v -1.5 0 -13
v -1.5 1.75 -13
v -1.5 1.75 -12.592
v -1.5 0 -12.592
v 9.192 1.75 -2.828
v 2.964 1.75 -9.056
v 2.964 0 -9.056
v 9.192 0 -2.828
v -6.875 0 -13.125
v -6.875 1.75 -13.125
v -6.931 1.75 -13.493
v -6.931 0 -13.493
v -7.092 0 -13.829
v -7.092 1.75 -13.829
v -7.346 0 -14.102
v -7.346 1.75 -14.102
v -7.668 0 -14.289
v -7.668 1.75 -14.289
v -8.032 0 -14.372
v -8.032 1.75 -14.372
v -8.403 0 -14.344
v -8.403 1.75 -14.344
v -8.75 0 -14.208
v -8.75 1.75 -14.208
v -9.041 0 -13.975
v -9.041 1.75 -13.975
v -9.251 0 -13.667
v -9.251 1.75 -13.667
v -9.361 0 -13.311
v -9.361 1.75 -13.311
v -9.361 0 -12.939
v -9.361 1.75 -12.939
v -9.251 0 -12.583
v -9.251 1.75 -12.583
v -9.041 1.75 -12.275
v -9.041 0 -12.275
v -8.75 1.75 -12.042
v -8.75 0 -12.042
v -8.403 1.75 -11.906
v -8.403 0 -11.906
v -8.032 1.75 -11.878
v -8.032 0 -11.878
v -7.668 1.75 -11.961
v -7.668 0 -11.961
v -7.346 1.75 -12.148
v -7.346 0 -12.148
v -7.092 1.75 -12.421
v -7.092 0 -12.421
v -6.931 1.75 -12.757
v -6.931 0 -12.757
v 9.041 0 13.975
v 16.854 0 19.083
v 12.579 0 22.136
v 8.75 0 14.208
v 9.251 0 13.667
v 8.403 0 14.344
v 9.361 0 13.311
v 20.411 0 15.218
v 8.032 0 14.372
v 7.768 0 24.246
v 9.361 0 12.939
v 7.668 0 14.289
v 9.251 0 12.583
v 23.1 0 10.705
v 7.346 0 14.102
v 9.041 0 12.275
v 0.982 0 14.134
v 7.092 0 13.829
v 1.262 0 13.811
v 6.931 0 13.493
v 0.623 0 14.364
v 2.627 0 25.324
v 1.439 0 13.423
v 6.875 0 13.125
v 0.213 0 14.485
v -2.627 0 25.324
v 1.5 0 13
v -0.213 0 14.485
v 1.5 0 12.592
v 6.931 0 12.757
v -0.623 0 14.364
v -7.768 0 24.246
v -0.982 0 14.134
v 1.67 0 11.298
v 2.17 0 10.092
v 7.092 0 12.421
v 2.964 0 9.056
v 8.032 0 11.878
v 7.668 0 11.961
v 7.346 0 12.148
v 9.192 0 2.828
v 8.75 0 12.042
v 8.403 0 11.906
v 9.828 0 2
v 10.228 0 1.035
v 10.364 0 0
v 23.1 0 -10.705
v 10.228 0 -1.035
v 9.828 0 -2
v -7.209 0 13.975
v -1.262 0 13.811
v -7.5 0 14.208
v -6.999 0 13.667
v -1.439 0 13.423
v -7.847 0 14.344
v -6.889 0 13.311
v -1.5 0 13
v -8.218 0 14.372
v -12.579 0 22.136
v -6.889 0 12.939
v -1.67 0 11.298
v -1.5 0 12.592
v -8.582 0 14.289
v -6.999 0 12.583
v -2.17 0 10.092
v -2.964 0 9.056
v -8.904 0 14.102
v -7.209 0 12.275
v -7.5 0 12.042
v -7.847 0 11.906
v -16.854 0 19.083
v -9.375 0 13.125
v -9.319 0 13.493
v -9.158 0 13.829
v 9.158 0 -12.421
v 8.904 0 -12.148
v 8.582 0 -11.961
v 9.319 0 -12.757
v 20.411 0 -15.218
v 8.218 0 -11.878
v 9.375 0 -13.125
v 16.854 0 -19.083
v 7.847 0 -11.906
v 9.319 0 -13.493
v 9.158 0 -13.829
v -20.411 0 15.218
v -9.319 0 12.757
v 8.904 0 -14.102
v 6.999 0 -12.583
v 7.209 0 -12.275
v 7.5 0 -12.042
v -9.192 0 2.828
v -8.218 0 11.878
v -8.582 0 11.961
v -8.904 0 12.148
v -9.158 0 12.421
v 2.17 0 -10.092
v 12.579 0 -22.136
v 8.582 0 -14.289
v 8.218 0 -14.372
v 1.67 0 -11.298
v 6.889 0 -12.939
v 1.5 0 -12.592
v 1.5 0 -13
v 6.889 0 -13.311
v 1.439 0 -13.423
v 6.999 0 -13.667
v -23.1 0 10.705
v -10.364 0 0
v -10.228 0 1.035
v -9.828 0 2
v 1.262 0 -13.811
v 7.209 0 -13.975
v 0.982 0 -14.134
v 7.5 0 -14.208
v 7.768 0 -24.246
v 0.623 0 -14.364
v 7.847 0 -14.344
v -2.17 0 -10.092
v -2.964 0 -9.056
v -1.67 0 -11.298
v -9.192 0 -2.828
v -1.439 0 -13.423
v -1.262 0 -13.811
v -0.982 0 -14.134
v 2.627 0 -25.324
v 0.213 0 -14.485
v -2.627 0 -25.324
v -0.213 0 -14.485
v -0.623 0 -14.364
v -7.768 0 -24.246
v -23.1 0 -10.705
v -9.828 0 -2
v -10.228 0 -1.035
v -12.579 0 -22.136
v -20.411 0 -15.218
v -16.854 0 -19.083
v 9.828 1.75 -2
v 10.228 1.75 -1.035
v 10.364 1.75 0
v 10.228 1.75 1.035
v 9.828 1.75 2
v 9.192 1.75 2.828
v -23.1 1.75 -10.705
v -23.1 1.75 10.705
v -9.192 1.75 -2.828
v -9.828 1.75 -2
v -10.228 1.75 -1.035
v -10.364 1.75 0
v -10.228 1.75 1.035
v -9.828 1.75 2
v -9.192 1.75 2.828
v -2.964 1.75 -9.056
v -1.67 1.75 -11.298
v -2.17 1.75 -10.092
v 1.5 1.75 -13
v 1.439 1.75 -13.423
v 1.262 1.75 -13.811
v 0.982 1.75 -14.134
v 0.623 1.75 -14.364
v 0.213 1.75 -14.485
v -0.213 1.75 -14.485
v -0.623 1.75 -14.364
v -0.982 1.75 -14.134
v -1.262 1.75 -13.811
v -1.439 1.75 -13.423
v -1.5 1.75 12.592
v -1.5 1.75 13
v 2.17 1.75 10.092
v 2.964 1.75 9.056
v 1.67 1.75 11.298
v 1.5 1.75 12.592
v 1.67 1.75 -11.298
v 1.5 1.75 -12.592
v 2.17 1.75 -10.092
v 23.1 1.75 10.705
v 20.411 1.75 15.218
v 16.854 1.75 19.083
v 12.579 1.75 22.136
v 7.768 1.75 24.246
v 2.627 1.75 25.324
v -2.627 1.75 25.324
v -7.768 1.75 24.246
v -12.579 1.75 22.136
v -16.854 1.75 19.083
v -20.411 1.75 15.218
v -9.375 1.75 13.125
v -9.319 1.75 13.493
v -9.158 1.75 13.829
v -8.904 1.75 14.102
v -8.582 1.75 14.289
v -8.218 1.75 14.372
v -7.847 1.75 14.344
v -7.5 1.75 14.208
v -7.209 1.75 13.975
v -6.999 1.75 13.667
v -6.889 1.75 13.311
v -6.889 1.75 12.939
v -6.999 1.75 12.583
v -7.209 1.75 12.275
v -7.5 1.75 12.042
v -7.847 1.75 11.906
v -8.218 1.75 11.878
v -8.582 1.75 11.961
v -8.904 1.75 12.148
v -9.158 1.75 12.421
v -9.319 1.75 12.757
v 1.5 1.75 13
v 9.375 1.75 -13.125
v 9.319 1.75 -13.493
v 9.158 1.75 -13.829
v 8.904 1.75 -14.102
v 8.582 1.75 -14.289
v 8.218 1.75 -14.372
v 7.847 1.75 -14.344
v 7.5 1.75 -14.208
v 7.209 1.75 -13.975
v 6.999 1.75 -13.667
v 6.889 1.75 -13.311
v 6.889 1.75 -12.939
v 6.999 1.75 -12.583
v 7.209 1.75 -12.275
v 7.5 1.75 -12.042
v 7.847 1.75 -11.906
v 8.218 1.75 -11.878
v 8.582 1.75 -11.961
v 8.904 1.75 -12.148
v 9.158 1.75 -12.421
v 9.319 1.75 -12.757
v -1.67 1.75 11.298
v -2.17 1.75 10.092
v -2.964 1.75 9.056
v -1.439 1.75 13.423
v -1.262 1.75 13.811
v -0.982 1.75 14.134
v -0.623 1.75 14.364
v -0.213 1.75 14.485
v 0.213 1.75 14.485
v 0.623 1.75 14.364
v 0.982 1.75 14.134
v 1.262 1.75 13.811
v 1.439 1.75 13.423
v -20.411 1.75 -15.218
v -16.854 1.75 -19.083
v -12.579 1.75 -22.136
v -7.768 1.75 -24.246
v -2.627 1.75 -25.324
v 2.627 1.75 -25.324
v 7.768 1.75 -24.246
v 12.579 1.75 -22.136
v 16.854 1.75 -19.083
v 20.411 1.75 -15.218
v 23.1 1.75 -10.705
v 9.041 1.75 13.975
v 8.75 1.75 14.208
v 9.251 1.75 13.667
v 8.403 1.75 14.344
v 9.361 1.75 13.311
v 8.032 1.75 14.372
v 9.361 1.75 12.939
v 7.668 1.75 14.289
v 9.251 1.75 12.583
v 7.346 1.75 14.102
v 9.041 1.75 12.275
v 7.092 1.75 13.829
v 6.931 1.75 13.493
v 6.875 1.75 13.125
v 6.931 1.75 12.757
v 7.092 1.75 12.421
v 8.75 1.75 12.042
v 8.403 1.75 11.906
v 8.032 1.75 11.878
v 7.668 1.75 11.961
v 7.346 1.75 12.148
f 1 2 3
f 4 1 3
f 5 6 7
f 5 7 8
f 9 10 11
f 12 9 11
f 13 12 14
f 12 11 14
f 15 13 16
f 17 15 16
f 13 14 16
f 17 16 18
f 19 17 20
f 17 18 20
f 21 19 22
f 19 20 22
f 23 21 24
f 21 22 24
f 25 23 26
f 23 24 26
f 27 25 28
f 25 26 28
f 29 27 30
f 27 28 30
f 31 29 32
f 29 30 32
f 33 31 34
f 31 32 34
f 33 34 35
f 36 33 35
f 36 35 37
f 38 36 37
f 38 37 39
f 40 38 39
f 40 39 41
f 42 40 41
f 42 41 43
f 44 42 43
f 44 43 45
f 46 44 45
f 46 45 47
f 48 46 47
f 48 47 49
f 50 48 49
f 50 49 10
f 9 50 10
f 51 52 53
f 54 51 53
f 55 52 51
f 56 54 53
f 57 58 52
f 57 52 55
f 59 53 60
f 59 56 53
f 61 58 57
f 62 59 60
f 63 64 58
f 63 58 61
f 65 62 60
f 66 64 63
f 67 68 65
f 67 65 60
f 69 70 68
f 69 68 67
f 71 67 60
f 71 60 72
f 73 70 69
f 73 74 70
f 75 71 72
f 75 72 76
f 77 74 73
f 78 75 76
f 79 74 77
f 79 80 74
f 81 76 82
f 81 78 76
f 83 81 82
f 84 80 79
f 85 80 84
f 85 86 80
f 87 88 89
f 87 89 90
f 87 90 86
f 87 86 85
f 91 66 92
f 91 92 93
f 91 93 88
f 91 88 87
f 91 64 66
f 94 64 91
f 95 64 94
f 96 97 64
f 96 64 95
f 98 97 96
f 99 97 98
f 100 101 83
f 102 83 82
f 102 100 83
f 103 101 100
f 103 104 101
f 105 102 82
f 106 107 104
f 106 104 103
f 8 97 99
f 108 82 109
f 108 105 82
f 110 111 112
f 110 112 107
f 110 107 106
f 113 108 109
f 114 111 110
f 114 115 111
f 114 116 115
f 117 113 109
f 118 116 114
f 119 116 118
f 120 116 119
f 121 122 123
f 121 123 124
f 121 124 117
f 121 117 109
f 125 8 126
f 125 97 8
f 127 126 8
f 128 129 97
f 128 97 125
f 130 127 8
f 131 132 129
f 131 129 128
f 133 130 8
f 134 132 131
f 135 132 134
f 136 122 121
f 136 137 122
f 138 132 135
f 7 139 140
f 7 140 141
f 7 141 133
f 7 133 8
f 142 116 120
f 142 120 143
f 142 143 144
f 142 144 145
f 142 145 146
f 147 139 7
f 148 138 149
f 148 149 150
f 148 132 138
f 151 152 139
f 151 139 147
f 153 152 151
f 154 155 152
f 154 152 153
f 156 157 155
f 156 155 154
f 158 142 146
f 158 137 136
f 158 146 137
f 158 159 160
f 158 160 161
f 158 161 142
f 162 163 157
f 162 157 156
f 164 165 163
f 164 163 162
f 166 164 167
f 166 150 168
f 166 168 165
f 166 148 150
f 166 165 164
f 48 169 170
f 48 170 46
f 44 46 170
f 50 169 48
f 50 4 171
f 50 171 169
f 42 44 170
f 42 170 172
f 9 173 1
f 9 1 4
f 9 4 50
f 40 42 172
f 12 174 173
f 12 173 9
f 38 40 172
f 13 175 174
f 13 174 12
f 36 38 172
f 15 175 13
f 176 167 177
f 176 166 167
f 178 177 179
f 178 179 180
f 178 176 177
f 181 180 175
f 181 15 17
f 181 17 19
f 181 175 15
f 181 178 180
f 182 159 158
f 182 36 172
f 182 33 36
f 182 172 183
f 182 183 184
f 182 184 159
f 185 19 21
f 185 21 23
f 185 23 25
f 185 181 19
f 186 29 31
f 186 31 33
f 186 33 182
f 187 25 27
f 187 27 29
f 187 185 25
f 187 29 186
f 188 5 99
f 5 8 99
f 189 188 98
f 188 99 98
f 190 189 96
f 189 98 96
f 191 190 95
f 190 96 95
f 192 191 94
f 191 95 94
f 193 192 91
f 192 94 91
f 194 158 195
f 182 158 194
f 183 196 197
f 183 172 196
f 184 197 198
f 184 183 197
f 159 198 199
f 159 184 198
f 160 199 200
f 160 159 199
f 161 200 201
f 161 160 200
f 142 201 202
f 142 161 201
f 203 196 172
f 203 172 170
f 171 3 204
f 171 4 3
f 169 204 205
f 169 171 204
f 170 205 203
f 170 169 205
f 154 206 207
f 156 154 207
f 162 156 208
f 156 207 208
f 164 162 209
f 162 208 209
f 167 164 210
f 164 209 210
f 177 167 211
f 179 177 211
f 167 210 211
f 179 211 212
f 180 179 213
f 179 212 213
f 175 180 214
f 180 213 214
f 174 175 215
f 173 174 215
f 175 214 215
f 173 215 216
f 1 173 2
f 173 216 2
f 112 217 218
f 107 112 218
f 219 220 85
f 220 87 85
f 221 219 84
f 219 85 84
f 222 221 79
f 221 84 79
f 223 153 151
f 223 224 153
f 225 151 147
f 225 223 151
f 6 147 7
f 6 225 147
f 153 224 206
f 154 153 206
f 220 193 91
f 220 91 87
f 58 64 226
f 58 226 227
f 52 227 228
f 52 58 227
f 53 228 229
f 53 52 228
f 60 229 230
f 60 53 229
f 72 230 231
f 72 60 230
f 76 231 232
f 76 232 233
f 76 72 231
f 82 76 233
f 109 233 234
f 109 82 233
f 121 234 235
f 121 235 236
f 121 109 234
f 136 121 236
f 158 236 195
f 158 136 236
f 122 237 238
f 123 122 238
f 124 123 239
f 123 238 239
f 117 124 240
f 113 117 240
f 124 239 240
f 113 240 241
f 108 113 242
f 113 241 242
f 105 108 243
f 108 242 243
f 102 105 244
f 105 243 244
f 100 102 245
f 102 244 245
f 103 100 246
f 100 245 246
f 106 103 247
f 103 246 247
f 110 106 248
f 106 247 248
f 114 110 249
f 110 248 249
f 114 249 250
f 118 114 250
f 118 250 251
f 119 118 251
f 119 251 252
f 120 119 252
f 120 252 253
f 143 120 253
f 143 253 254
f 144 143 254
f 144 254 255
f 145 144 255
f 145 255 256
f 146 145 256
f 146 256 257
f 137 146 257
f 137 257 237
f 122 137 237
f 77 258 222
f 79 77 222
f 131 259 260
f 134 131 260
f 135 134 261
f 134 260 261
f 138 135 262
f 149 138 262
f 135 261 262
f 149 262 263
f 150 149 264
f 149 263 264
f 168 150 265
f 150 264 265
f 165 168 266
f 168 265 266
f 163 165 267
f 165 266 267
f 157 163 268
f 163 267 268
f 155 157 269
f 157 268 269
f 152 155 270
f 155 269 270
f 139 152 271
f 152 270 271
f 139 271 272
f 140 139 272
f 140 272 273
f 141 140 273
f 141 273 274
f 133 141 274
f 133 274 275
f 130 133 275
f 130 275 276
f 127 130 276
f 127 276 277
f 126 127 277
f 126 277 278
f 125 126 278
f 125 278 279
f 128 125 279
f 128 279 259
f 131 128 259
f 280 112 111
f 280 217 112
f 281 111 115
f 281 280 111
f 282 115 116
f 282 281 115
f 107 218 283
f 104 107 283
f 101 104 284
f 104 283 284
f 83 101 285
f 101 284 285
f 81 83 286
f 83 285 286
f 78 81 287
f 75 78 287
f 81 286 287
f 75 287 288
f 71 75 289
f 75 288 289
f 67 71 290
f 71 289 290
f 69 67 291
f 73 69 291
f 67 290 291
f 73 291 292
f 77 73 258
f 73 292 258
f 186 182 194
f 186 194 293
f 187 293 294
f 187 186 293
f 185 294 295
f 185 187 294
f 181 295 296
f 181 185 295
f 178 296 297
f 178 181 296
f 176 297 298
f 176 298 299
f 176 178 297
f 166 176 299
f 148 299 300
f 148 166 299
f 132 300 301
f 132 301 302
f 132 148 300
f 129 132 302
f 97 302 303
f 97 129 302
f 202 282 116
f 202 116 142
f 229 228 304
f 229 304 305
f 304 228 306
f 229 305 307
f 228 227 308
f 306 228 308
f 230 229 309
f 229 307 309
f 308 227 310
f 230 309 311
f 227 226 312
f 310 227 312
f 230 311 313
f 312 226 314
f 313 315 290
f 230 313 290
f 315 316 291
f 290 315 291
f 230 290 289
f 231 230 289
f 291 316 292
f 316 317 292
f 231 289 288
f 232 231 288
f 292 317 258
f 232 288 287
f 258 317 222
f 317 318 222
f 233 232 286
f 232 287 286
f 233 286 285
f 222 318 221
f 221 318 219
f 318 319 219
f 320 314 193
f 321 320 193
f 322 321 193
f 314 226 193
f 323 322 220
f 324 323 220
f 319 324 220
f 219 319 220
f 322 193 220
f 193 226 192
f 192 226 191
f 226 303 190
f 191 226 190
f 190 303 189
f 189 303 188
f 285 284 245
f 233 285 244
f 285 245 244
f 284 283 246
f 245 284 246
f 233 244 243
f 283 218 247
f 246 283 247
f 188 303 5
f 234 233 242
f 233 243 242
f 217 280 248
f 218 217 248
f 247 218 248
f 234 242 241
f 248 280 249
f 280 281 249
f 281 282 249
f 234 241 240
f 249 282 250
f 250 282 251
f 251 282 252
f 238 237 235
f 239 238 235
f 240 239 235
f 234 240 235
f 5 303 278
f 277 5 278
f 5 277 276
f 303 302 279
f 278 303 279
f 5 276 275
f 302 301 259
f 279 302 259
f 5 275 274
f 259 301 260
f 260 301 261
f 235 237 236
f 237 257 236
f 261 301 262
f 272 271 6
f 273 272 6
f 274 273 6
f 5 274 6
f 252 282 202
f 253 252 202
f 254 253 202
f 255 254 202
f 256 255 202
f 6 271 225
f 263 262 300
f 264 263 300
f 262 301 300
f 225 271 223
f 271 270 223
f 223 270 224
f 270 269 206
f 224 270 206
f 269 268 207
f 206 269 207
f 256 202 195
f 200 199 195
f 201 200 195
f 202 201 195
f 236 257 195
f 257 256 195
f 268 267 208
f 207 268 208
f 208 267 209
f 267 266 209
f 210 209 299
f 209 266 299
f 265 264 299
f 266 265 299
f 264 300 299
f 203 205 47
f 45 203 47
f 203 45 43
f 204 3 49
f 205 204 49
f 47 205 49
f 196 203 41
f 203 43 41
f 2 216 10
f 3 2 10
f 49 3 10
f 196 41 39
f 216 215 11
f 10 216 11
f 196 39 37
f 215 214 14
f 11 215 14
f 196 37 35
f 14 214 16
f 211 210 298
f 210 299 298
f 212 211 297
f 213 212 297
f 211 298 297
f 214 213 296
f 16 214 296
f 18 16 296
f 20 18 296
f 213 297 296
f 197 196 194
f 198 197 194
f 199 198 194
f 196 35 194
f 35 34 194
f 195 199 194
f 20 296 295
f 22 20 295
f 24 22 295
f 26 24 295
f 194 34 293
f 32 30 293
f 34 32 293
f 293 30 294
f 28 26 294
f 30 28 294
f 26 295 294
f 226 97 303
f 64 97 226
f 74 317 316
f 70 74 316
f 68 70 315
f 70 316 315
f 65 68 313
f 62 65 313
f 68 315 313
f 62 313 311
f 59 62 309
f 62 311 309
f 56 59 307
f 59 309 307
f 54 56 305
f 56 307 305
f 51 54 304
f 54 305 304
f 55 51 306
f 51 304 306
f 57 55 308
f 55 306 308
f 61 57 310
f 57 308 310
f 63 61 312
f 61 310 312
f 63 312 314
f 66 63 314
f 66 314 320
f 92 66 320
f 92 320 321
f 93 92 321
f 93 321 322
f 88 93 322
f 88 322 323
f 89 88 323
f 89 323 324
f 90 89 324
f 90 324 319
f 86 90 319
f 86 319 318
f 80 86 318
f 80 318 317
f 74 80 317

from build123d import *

# Parameters (mm, degrees)
BOSS_EXTRUDE1_DEPTH = 1.75
CUT_EXTRUDE1_DEPTH  = 2.75
CUT_EXTRUDE2_DEPTH  = 1.75
FILLET2_R           = 5
FILLET1_R           = 4
SKETCH6_R           = 1.25
CUT_EXTRUDE3_DEPTH  = 2.75
CIRPATTERN3_COUNT   = 2


with BuildPart() as part:
    # Sketch1 → Boss-Extrude1 (new body)
    with BuildSketch(Plane(origin=(0, 0, 0), x_dir=(1, 0, 0), z_dir=(0, 1, 0))):
        with BuildLine():
            Line((-23.1, -10.705213683), (-23.1, 10.705213683))
            ThreePointArc((-23.1, 10.705213683), (0, 25.46), (23.1, 10.705213683))
            Line((23.1, 10.705213683), (23.1, -10.705213683))
            ThreePointArc((23.1, -10.705213683), (0, -25.46), (-23.1, -10.705213683))
        make_face()
    extrude(amount=BOSS_EXTRUDE1_DEPTH)

    # Sketch3 → Cut-Extrude1 (cut, through all)
    with BuildSketch(Plane(origin=(0, 1.75, 0), x_dir=(1, 0, 0), z_dir=(0, 1, 0))):
        Polygon((0, -12.02081528), (-12.02081528, 0), (0, 12.02081528), (12.02081528, 0), align=None)
    extrude(amount=-CUT_EXTRUDE1_DEPTH, mode=Mode.SUBTRACT)

    # Sketch4 → Cut-Extrude2 (cut)
    with BuildSketch(Plane(origin=(0, 1.75, 0), x_dir=(1, 0, 0), z_dir=(0, 1, 0))):
        with BuildLine():
            Line((-1.5, 13), (-1.5, -13))
            ThreePointArc((-1.5, -13), (0, -14.5), (1.5, -13))
            Line((1.5, -13), (1.5, 13))
            ThreePointArc((1.5, 13), (0, 14.5), (-1.5, 13))
        make_face()
    extrude(amount=-CUT_EXTRUDE2_DEPTH, mode=Mode.SUBTRACT)

    # Fillet2
    fillet2_edges = [part.edges().sort_by_distance(p)[0] for p in [
        (1.5, 0.875, -10.52081528),
        (-1.5, 0.875, -10.52081528),
        (-1.5, 0.875, 10.52081528),
        (1.5, 0.875, 10.52081528),
    ]]
    fillet(fillet2_edges, radius=FILLET2_R)

    # Fillet1
    fillet1_edges = [part.edges().sort_by_distance(p)[0] for p in [
        (12.02081528, 0.875, 0),
        (-12.02081528, 0.875, 0),
    ]]
    fillet(fillet1_edges, radius=FILLET1_R)

    # Sketch6 → Cut-Extrude3 (cut, through all)
    with BuildSketch(Plane(origin=(0, 1.75, 0), x_dir=(1, 0, 0), z_dir=(0, 1, 0))):
        with Locations((-8.125, 13.125)):
            Circle(SKETCH6_R)
        with Locations((8.125, 13.125)):
            Circle(SKETCH6_R)
    cut_extrude3 = extrude(amount=-CUT_EXTRUDE3_DEPTH, mode=Mode.SUBTRACT)

    # CirPattern3: Cut-Extrude3 ×2 about axis
    cirpattern3_axis = Axis((0, 0, 0), (0, 1, 0))
    for i in range(1, CIRPATTERN3_COUNT):
        add(cut_extrude3.rotate(cirpattern3_axis, i * 360 / CIRPATTERN3_COUNT), mode=Mode.SUBTRACT)


solid = part.part
